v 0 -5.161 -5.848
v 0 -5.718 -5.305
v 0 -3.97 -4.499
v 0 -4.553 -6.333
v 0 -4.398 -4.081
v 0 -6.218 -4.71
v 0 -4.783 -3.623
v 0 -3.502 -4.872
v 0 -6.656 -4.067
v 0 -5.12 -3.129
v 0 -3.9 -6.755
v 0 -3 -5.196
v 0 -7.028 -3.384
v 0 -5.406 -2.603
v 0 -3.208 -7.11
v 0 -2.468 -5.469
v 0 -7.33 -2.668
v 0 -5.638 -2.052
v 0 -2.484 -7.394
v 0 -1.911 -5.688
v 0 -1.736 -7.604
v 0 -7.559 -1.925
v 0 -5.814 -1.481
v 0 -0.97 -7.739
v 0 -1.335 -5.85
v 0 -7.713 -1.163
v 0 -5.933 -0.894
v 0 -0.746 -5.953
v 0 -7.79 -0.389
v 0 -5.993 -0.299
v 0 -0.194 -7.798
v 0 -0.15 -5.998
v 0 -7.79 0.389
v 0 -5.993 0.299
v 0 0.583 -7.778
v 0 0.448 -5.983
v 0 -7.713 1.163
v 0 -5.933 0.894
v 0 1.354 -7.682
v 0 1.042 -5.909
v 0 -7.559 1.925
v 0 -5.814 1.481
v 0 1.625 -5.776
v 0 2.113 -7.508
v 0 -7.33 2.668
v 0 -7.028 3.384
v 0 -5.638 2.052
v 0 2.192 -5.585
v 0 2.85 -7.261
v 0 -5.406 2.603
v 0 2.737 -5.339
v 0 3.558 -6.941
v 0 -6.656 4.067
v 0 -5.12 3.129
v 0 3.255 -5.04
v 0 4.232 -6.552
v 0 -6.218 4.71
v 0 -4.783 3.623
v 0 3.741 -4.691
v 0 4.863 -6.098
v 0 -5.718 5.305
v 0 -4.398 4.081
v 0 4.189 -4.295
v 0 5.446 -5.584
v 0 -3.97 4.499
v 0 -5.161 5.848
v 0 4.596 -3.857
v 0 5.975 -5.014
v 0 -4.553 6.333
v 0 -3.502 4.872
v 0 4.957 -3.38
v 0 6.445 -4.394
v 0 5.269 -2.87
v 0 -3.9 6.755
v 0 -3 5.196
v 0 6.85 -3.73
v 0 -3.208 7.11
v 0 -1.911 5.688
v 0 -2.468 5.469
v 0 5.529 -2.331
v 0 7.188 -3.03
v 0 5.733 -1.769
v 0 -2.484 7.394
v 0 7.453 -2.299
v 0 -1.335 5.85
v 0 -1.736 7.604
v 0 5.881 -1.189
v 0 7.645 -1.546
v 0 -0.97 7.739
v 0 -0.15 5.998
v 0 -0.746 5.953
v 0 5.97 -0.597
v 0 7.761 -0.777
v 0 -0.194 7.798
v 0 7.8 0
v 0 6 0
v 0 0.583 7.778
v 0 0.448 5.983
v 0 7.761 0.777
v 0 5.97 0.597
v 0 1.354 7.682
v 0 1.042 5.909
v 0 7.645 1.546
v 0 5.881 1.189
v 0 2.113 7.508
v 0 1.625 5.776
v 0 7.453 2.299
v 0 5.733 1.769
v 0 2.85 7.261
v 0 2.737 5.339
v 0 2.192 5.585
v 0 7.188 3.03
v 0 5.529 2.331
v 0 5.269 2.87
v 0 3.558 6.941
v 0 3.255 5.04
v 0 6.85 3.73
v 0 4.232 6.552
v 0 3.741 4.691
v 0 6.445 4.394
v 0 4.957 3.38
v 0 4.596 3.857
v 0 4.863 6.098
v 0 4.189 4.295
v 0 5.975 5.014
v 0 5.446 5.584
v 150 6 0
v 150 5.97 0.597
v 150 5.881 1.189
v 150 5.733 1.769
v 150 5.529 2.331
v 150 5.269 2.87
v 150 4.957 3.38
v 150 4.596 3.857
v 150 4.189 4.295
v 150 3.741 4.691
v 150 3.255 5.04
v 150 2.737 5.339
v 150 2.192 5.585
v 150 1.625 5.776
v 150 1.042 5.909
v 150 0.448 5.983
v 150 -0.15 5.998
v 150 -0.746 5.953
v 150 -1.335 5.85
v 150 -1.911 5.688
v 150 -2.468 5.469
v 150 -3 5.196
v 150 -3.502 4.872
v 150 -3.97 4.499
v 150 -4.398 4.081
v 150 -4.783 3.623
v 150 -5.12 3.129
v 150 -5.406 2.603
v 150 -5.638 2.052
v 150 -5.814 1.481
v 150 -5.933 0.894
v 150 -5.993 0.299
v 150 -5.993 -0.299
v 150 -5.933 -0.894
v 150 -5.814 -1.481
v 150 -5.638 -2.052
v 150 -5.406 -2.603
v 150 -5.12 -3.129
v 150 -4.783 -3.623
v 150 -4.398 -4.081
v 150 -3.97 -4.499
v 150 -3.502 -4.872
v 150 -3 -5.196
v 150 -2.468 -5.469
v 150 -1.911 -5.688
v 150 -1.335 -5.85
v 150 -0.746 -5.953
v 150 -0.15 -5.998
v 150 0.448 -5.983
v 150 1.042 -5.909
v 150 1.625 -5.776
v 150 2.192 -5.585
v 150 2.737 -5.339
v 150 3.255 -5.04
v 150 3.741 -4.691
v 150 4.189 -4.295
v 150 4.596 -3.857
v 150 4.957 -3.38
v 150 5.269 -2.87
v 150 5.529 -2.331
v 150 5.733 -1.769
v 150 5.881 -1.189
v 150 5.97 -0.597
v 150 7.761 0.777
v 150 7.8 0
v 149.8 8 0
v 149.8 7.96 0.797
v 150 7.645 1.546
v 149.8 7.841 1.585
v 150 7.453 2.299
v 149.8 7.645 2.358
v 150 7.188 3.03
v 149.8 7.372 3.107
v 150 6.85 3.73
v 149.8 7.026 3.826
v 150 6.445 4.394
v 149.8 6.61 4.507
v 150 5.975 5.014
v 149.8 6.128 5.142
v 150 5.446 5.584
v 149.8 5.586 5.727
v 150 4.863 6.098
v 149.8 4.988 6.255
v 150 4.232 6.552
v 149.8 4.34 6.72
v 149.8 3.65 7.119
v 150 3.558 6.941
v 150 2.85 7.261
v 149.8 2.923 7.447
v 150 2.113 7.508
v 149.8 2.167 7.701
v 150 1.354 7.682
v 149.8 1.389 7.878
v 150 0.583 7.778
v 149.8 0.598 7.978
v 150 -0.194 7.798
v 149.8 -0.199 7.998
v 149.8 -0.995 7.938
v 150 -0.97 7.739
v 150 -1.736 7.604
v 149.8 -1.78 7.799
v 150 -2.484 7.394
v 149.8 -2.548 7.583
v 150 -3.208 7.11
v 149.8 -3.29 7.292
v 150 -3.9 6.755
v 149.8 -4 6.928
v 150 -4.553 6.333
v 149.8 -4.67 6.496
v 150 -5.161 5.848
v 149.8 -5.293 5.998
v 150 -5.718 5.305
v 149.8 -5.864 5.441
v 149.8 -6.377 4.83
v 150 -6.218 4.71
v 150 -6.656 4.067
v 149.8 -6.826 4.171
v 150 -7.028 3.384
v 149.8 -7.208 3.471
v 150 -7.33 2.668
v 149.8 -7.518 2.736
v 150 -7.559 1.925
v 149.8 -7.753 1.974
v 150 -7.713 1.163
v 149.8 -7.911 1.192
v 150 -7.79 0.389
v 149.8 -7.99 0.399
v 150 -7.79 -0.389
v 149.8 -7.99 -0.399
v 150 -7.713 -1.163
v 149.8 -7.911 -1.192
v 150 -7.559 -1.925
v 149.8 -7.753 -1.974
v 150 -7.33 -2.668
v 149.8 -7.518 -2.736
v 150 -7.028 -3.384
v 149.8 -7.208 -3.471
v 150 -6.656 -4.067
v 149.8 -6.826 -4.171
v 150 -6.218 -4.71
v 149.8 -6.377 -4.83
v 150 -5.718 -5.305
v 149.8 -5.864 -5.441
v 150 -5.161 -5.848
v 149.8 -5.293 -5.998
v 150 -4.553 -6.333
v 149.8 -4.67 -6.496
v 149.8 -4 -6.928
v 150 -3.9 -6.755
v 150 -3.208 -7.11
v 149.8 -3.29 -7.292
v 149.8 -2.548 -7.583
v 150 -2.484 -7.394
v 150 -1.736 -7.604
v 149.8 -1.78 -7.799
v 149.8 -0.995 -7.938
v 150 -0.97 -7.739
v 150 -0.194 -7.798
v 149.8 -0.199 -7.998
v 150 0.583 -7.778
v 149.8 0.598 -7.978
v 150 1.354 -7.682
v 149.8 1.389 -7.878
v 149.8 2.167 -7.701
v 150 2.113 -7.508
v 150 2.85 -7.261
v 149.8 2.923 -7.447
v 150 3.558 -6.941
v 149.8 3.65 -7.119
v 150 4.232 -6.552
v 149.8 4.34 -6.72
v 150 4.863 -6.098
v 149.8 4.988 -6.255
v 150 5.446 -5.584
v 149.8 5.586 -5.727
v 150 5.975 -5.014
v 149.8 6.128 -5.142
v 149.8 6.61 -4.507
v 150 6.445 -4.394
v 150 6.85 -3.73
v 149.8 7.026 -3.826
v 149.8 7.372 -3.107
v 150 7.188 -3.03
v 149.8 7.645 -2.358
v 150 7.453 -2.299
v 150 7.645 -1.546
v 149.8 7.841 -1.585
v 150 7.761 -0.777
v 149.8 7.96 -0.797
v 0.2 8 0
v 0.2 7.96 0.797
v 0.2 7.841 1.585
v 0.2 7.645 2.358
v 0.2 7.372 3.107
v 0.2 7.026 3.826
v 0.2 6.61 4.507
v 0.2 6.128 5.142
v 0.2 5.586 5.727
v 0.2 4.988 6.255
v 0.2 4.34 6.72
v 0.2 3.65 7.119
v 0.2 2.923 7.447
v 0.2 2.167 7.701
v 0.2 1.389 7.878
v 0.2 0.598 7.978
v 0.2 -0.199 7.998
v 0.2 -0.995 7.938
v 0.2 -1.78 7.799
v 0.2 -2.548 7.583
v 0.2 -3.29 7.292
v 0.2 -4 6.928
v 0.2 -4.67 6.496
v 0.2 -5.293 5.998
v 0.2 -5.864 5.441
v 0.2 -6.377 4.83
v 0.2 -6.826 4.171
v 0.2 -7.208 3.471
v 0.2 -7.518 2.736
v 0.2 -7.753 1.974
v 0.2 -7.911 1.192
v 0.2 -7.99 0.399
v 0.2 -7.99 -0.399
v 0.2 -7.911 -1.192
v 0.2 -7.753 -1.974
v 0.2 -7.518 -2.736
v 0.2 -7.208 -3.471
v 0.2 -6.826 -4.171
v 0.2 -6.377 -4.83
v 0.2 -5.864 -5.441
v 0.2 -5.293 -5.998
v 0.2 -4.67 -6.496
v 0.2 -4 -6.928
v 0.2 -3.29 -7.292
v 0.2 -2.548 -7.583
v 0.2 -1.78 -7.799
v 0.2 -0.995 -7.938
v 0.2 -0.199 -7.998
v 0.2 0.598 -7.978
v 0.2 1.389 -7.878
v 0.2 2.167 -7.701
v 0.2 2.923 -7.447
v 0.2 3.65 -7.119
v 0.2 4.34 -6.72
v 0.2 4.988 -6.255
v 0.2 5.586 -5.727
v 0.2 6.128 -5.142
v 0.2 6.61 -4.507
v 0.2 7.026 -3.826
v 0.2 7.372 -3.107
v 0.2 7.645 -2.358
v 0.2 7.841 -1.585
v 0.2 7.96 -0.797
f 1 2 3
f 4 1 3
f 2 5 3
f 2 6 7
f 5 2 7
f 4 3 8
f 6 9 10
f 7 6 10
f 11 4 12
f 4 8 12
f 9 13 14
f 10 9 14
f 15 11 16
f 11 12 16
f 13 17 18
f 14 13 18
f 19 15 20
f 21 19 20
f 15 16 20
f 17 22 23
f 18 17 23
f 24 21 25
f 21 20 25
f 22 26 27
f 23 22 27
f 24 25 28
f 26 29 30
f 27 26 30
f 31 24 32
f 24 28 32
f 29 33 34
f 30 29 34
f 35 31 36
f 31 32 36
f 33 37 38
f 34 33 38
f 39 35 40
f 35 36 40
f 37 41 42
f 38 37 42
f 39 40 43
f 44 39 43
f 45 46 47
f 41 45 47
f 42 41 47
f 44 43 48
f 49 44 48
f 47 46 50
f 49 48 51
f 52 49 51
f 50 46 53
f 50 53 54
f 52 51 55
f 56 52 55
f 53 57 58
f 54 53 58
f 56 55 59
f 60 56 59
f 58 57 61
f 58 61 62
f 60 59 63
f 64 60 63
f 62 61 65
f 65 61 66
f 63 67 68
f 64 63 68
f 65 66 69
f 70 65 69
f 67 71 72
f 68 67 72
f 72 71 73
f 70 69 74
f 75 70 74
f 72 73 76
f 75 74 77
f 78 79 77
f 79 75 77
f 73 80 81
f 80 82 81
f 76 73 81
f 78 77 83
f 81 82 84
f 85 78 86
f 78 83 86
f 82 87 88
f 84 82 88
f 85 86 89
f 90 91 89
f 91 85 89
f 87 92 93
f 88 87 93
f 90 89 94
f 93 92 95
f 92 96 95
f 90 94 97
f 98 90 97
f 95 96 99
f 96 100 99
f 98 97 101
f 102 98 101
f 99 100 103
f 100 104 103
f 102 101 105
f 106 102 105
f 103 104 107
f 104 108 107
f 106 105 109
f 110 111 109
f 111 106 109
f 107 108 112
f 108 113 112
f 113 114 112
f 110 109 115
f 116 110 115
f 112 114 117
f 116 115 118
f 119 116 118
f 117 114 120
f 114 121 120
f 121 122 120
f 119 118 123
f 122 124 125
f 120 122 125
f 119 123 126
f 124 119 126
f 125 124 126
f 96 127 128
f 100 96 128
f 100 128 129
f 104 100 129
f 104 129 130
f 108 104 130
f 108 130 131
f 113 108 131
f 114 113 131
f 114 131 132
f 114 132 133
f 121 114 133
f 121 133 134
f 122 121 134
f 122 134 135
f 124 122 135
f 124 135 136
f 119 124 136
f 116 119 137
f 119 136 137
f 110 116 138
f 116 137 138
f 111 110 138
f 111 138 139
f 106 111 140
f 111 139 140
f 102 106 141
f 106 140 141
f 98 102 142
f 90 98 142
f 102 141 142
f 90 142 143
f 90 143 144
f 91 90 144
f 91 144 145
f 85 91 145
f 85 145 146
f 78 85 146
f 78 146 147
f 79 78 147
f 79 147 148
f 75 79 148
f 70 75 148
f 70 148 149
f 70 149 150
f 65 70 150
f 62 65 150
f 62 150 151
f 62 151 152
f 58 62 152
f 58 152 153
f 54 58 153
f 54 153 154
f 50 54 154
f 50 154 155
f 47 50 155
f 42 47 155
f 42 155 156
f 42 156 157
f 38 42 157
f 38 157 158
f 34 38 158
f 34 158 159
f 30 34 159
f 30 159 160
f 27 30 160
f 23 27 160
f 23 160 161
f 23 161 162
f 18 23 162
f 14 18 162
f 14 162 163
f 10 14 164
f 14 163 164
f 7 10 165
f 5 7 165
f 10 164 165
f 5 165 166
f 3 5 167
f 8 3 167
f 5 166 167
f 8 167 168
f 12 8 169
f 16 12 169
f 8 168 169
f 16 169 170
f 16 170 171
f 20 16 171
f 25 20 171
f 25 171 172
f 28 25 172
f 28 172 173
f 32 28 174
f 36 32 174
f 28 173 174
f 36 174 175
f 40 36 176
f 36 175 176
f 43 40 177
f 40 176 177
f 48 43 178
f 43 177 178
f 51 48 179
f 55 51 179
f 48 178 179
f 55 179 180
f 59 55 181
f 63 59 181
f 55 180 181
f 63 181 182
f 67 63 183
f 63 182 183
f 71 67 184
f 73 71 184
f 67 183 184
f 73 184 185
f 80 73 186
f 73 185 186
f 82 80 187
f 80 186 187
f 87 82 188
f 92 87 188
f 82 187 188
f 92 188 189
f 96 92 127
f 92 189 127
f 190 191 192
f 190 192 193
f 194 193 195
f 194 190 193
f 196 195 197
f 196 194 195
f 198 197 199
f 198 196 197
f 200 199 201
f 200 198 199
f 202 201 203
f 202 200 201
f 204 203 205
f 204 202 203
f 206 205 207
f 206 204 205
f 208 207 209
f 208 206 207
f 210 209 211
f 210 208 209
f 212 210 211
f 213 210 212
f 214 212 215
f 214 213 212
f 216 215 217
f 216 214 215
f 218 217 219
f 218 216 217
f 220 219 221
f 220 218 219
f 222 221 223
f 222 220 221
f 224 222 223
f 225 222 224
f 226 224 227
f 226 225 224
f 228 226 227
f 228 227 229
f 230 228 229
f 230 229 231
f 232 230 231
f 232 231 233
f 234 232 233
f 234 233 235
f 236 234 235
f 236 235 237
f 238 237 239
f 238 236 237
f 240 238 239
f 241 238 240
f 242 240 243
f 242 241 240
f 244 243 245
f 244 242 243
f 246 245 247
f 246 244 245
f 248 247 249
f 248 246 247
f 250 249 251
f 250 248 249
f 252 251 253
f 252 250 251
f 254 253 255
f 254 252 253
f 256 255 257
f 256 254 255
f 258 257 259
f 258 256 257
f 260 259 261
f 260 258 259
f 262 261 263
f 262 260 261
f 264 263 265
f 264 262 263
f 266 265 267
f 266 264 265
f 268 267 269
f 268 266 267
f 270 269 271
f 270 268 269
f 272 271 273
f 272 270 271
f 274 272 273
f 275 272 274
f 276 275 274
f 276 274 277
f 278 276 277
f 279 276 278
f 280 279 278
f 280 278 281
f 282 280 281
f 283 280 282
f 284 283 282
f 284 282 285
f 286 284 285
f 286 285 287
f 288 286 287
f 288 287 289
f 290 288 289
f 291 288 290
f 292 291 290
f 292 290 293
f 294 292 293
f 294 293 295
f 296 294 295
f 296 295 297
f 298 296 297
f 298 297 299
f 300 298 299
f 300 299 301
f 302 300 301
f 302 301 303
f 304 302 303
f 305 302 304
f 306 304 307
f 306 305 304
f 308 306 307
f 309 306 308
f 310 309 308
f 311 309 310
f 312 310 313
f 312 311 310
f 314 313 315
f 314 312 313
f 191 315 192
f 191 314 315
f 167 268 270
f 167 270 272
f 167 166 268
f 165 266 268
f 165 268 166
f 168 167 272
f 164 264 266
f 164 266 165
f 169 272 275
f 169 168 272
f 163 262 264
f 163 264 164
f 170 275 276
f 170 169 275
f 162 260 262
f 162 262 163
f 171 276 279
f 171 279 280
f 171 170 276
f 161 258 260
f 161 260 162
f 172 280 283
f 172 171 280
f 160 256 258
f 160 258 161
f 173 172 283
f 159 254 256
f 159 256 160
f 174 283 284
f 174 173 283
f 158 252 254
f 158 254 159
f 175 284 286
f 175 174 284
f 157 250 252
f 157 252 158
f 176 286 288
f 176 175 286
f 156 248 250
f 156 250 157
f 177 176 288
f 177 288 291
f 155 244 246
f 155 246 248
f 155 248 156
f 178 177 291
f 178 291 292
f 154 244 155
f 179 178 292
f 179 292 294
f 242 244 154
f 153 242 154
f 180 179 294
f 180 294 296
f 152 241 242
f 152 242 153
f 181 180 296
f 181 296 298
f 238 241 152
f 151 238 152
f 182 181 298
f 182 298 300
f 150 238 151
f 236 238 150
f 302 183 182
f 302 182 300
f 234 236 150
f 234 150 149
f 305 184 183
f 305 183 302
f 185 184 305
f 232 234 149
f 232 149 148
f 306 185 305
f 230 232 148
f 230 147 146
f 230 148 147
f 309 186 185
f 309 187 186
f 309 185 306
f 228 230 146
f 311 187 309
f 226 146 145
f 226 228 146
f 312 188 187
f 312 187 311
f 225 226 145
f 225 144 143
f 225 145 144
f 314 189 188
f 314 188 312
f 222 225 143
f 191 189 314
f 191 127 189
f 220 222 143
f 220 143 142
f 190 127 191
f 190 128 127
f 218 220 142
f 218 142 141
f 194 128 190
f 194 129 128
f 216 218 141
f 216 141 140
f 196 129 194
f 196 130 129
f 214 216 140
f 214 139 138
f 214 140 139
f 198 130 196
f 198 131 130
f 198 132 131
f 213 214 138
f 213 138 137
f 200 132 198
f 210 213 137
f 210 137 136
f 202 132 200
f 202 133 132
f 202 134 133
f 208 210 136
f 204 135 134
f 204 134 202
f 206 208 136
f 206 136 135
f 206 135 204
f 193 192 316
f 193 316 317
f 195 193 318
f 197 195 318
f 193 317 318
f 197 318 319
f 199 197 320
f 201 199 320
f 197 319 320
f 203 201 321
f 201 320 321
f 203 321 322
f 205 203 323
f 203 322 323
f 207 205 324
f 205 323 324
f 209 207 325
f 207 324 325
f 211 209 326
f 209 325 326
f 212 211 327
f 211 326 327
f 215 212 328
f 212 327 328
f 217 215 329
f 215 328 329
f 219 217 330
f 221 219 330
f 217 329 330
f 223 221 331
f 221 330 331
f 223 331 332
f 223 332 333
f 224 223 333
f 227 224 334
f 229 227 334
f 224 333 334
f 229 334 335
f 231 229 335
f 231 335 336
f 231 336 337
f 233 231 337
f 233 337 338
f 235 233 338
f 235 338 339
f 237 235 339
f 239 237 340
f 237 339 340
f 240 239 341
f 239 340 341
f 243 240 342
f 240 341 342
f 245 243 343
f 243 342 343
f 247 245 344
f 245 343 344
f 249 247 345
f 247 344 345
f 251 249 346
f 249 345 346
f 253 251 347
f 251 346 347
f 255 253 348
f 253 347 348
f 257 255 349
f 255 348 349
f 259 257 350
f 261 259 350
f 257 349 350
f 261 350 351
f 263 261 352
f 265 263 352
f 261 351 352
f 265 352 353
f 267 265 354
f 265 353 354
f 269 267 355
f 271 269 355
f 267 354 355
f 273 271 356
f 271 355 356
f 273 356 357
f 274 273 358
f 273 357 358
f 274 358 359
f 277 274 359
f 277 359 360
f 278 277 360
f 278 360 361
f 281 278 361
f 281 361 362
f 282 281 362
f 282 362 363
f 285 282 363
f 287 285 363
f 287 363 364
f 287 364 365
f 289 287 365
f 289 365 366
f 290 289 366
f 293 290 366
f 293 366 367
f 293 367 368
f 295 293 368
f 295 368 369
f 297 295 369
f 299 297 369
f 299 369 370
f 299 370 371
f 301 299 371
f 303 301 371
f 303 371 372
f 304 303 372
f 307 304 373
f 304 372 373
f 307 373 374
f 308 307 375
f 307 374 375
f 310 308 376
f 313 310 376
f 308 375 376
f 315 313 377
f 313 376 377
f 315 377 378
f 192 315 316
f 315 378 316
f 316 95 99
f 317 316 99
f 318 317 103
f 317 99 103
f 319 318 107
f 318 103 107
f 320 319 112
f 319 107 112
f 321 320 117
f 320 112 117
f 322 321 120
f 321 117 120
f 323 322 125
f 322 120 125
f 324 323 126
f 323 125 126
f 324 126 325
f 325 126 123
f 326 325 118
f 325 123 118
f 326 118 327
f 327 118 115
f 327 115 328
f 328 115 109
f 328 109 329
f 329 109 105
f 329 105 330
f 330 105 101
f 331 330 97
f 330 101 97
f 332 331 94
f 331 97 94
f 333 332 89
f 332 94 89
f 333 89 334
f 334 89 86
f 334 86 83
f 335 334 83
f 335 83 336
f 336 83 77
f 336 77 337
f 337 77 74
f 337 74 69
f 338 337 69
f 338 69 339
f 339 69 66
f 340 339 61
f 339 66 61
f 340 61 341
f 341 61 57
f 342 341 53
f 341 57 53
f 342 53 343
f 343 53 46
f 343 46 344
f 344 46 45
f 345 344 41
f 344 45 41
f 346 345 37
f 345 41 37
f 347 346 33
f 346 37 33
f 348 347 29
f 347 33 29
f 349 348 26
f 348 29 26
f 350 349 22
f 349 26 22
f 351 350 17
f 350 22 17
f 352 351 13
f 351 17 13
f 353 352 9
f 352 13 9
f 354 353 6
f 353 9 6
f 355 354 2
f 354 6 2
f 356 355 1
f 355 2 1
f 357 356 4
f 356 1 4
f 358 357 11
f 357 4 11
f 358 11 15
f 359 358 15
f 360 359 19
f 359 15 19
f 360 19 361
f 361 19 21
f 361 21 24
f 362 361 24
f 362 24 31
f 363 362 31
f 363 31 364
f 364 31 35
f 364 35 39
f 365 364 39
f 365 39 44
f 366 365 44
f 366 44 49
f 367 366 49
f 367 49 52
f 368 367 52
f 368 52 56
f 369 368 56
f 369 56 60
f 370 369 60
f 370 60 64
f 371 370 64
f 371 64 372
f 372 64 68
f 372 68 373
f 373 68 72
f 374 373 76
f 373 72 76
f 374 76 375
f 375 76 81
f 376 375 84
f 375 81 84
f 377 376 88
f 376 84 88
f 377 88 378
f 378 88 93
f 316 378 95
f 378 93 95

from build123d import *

# Parameters (mm, degrees)
F0_R     = 8
F1_DEPTH = 150
F2_R     = 6
F3_DEPTH = 150.001
F4_SIZE  = 0.2
F5_SIZE  = 0.2


with BuildPart() as f1:
    # F0 (on Right) → F1 (new body)
    with BuildSketch(Plane.YZ):
        Circle(F0_R)
    extrude(amount=F1_DEPTH)

    # F2 (on face) → F3 (cut, through all)
    with BuildSketch(Plane.YZ.offset(150)):
        Circle(F2_R)
    extrude(amount=-F3_DEPTH, mode=Mode.SUBTRACT)

    # F4
    f4_edges = [f1.edges().sort_by_distance(p)[0] for p in [
        (150, -8, 0),
    ]]
    chamfer(f4_edges, length=F4_SIZE)

    # F5
    f5_edges = [f1.edges().sort_by_distance(p)[0] for p in [
        (0, -8, 0),
    ]]
    chamfer(f5_edges, length=F5_SIZE)


solid = f1.part
